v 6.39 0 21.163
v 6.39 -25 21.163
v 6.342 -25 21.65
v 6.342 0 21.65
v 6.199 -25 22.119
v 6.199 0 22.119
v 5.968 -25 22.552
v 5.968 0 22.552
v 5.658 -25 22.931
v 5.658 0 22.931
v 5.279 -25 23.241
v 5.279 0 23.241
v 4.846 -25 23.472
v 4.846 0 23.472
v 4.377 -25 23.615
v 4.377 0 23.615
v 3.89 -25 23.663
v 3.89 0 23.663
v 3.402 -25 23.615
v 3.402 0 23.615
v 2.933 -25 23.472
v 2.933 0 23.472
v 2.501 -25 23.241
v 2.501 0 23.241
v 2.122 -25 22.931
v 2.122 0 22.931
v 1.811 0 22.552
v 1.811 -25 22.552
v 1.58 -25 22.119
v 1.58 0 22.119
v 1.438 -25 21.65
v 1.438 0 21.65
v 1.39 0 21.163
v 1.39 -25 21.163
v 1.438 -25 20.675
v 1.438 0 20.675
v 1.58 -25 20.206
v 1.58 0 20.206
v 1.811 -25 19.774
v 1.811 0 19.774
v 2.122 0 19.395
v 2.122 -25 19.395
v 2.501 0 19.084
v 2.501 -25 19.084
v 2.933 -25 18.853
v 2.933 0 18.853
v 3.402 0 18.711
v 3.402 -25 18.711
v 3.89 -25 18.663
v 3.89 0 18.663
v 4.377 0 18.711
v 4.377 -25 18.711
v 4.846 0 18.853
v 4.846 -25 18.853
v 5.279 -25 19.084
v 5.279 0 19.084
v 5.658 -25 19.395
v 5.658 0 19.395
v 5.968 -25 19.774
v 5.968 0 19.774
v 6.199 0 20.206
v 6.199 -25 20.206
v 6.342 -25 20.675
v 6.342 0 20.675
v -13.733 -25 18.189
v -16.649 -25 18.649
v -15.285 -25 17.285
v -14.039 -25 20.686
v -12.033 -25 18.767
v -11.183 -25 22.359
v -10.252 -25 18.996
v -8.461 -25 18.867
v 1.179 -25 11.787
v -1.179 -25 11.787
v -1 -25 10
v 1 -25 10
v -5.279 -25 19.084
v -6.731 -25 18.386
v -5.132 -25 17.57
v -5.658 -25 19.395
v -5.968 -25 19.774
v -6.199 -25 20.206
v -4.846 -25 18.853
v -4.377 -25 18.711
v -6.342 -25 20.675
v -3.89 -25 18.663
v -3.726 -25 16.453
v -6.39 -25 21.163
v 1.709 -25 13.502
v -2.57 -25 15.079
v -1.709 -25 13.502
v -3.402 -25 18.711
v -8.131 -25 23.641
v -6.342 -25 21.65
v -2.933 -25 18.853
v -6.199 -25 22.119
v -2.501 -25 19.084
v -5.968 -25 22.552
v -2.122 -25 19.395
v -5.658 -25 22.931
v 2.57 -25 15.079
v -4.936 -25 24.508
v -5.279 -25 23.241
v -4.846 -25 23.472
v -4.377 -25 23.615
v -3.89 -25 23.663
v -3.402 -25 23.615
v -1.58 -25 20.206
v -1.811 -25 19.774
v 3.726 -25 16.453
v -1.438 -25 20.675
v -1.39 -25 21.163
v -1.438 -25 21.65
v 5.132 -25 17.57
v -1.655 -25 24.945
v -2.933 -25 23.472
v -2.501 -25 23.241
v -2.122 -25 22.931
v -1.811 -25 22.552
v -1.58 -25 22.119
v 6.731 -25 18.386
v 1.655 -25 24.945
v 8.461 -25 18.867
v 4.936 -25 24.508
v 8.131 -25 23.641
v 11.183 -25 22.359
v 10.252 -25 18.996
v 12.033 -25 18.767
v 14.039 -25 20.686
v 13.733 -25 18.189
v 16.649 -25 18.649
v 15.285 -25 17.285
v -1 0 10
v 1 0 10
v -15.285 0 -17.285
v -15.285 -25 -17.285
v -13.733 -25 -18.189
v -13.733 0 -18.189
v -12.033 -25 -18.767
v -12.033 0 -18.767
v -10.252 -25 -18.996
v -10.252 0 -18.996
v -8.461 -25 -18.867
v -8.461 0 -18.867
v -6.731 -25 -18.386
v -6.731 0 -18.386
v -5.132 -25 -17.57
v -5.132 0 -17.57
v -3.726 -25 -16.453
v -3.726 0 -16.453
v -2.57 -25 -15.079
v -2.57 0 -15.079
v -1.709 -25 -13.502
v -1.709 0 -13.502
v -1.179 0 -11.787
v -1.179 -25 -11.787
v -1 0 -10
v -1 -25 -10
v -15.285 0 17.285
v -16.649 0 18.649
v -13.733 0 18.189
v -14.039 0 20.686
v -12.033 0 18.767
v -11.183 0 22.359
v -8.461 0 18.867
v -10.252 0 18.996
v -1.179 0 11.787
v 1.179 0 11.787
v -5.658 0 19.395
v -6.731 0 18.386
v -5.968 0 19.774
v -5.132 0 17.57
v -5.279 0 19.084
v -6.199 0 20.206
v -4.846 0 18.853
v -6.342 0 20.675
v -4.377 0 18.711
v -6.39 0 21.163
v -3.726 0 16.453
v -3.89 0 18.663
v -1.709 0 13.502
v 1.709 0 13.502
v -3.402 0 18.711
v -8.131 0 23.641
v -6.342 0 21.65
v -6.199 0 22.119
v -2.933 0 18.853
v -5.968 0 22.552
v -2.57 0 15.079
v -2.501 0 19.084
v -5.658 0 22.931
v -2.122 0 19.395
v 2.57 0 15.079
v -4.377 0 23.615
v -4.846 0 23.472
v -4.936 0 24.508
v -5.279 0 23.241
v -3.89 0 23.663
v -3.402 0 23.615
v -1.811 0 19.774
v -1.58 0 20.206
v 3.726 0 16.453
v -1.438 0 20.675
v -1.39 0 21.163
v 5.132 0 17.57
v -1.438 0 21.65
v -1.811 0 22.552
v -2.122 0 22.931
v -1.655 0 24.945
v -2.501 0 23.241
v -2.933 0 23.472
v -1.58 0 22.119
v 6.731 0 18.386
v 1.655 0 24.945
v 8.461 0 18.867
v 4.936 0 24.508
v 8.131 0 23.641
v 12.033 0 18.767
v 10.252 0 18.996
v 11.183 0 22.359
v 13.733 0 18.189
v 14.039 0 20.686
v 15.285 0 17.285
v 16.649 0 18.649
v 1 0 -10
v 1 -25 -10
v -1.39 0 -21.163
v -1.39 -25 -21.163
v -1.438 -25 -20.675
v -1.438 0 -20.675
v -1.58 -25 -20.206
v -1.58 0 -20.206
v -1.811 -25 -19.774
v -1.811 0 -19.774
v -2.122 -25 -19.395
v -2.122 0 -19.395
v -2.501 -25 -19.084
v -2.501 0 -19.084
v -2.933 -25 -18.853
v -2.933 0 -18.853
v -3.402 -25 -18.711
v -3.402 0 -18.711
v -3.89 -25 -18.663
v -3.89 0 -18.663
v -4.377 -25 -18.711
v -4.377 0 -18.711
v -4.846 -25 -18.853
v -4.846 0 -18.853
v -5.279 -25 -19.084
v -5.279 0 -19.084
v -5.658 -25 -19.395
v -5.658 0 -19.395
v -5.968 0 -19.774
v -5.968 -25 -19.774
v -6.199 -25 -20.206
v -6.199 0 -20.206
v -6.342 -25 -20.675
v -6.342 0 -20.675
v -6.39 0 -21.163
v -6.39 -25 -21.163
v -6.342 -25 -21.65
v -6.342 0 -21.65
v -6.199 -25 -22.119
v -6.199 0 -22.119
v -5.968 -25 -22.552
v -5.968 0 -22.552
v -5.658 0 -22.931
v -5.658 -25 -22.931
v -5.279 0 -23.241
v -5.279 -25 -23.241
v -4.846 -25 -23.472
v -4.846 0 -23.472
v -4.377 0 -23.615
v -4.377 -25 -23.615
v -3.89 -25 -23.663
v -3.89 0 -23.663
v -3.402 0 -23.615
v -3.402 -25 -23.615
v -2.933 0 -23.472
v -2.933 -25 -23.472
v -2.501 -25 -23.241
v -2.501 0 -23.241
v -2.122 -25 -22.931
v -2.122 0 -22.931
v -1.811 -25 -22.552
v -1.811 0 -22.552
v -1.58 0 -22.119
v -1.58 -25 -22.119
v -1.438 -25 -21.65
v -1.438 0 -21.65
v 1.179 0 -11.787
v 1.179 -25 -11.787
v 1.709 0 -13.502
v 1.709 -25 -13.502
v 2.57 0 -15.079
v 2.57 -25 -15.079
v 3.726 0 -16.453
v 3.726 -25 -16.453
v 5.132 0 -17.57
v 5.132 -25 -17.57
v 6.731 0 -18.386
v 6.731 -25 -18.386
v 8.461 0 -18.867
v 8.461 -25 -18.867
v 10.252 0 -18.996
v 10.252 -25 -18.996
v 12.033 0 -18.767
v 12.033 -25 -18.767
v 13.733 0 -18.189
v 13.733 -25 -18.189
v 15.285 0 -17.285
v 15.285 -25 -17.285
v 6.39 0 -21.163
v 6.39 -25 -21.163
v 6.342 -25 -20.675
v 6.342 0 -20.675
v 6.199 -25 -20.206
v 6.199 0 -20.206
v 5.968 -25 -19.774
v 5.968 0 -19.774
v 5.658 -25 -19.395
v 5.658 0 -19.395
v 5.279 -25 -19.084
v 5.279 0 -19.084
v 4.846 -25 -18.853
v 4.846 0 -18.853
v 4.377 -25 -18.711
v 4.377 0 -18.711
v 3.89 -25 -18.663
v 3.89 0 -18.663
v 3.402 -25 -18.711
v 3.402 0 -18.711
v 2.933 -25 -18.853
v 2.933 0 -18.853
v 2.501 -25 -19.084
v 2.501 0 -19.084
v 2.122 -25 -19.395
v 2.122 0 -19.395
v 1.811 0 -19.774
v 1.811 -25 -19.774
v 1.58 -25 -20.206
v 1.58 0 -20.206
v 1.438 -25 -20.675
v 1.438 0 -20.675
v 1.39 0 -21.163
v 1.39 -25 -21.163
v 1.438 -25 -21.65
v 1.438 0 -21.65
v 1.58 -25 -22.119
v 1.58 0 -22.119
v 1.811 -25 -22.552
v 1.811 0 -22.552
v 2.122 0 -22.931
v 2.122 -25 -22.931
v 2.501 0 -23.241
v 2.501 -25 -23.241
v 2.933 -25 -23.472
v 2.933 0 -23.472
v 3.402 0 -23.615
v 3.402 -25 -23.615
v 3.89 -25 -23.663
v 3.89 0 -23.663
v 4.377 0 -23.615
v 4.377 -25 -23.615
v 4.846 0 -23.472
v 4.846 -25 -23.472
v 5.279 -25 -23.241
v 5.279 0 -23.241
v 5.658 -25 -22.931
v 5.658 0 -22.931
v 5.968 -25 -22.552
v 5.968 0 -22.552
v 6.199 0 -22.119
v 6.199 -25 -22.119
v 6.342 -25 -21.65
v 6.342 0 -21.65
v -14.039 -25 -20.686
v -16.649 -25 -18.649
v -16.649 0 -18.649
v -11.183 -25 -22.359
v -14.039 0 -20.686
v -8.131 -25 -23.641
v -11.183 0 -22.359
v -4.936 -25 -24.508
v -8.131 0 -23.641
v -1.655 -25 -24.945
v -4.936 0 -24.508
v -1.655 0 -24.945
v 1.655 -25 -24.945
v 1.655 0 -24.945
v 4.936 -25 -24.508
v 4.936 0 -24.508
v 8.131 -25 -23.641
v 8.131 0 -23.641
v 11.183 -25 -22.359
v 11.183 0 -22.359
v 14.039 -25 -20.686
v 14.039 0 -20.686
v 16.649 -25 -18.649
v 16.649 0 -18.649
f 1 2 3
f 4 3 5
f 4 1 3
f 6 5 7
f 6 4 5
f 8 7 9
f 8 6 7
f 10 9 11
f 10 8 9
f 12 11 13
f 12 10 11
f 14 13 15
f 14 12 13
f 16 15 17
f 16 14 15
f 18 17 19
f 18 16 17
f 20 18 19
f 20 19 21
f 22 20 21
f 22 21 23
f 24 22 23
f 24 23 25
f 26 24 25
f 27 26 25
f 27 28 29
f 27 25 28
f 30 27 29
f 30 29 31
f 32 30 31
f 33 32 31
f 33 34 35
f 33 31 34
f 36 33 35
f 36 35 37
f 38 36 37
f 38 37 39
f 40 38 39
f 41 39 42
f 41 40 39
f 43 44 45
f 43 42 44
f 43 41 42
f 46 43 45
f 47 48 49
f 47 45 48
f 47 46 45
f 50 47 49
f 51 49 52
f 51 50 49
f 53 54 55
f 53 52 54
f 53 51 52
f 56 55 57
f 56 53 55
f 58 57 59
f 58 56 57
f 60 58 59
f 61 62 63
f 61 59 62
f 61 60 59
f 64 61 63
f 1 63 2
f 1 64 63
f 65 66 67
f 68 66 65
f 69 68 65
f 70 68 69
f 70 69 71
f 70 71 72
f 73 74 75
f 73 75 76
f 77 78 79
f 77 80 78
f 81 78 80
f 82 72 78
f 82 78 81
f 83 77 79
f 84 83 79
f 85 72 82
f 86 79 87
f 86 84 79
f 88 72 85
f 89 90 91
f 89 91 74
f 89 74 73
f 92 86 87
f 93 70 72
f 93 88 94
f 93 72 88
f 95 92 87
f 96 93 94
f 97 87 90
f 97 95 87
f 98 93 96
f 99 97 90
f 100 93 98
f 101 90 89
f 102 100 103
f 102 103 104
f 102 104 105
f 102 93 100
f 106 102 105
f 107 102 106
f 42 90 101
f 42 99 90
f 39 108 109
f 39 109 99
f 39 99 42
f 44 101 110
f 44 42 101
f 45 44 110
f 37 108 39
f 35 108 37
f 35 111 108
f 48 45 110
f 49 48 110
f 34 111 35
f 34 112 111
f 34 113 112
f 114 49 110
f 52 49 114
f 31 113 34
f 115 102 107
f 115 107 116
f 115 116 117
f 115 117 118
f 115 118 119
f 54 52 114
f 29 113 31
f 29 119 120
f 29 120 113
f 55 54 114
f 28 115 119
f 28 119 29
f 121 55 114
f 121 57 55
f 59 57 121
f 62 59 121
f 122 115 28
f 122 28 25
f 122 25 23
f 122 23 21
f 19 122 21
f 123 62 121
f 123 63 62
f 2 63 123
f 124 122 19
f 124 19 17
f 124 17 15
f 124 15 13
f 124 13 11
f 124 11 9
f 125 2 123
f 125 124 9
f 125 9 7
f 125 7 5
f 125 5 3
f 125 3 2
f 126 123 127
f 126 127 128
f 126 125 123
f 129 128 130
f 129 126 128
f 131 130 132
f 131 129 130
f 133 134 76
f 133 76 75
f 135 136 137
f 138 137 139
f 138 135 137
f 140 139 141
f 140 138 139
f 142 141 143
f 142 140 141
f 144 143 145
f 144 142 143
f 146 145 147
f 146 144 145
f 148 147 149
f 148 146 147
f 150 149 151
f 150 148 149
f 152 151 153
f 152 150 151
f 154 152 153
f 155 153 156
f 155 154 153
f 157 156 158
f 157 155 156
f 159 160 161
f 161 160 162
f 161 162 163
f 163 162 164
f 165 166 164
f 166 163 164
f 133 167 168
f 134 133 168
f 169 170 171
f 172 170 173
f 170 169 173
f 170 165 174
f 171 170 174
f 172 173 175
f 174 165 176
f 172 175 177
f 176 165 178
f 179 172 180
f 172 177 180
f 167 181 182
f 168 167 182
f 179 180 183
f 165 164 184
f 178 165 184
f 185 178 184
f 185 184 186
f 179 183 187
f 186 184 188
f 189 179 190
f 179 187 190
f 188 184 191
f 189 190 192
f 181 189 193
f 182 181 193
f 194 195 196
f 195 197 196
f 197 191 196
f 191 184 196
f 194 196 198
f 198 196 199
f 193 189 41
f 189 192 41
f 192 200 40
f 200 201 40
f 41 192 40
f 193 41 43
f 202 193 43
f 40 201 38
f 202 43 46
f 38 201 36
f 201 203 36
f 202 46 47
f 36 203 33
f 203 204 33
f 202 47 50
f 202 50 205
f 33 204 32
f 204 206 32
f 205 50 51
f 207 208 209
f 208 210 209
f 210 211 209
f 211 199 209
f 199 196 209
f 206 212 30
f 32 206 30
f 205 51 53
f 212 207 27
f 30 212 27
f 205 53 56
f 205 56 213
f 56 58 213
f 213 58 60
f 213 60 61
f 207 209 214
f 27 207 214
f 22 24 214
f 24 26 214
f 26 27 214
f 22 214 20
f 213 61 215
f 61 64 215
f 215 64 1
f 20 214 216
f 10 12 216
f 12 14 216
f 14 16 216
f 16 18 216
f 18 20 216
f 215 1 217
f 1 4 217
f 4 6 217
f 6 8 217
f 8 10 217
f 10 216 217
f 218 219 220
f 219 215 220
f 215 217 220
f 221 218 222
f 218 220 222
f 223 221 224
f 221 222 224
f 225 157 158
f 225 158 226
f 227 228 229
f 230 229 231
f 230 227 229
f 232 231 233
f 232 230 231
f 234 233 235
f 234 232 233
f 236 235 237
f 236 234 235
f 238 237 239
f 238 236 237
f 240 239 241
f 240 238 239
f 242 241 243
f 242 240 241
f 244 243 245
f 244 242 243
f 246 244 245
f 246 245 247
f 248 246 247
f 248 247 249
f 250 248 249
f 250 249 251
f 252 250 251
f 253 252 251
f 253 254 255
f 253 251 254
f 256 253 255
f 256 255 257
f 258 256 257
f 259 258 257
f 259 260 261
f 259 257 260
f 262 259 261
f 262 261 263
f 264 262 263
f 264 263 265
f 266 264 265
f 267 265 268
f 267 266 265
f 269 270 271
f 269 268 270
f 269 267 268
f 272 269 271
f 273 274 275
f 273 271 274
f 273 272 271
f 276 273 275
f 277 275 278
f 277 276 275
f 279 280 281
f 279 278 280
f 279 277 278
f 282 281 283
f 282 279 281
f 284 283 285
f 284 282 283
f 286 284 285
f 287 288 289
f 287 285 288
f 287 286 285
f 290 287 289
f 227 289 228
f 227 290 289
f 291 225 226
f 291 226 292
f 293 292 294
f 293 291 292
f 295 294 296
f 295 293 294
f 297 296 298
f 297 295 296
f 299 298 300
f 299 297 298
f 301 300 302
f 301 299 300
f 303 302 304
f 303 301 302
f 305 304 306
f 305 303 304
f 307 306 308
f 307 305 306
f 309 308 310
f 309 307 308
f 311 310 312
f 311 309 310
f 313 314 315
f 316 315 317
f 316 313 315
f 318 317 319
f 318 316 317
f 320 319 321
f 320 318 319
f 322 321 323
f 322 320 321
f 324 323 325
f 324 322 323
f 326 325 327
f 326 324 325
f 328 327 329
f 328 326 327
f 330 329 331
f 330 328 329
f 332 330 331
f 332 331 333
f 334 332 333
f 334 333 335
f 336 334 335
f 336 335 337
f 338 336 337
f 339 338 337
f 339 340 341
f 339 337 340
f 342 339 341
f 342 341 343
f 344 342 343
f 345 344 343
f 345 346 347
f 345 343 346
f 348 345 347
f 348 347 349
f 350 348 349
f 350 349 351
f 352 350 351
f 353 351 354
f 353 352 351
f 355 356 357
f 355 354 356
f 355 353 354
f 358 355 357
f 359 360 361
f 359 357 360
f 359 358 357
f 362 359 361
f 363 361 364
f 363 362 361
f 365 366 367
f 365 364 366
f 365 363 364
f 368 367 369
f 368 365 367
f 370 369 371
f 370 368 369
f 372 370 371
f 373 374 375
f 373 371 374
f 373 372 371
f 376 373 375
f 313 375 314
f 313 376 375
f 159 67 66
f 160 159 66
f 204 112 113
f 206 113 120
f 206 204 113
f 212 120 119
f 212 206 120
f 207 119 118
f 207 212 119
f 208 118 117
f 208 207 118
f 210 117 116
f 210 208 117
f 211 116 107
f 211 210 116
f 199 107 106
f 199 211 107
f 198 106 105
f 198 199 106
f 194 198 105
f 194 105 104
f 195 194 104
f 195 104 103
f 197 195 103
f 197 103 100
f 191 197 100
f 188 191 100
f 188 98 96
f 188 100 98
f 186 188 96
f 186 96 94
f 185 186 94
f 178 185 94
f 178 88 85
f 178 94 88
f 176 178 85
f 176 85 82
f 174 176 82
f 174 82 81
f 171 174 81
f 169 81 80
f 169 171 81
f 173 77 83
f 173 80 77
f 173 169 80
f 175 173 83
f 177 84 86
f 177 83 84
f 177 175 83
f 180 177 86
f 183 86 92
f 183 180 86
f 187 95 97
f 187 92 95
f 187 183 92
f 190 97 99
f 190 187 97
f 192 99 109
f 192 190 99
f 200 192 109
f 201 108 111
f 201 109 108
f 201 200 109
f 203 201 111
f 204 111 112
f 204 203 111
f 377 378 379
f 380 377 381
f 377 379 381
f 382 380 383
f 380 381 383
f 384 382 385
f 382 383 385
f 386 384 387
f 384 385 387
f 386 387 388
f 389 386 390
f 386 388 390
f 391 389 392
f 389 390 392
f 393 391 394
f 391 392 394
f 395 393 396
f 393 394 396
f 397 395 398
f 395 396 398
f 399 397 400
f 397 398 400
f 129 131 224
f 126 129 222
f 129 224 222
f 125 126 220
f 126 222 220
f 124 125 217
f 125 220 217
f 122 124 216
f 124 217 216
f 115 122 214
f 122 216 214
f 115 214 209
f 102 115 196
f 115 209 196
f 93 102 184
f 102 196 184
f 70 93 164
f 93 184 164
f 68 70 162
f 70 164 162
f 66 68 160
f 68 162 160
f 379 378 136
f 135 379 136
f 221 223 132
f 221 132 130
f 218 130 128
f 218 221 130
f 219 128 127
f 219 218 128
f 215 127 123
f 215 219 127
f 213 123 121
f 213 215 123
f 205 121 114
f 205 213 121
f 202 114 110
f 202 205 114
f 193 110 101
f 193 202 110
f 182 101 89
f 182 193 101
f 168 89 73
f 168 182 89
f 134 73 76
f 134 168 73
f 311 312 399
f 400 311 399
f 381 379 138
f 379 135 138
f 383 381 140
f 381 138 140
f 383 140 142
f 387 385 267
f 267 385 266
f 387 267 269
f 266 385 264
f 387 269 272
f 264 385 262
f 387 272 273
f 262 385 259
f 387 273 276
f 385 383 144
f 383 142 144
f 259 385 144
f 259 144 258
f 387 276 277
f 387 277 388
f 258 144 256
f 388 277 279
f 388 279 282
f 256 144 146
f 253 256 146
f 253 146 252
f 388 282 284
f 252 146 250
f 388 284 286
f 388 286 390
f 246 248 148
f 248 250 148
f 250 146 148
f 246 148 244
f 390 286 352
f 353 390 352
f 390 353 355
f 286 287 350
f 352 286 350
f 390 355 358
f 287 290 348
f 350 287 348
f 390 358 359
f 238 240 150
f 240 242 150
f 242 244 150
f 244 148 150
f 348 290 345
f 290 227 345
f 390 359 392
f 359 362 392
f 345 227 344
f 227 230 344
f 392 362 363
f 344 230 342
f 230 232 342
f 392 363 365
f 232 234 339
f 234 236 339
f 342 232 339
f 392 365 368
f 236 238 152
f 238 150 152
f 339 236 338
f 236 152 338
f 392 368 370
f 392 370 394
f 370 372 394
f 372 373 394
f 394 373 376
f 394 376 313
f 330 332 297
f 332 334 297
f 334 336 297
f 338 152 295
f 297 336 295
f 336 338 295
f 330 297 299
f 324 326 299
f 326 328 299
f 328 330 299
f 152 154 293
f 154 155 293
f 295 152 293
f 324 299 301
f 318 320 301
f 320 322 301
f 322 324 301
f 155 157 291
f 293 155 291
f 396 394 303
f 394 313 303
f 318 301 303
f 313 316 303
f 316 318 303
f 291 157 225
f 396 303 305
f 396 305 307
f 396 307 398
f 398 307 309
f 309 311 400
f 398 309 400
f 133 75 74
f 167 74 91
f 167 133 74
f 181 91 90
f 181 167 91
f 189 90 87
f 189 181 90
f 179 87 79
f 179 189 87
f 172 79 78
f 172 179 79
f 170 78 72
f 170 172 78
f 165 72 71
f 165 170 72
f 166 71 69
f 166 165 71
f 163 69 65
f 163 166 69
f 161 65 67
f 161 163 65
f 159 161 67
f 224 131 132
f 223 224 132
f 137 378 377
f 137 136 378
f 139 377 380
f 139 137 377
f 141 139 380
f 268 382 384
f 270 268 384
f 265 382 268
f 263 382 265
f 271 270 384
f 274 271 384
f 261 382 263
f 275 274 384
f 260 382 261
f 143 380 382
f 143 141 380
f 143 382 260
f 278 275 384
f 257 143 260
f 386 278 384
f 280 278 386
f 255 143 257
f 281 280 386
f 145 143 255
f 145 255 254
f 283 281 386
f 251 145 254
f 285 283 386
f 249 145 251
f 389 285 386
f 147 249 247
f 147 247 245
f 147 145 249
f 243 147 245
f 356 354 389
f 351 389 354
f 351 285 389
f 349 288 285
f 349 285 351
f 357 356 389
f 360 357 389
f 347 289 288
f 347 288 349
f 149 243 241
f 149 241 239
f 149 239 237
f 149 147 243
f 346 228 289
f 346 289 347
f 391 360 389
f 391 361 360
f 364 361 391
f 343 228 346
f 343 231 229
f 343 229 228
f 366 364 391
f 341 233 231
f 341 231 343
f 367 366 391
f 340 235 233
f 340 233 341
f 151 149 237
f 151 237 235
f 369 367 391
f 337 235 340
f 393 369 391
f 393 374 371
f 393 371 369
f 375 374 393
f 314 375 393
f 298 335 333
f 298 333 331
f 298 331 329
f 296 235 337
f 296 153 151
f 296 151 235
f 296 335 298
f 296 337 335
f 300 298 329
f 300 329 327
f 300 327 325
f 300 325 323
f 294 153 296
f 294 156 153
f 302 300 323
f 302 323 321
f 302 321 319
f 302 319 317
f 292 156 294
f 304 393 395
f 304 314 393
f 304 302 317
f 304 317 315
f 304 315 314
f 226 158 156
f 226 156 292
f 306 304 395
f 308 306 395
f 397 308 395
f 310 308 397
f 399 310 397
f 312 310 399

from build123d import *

# Parameters (mm, degrees)
F0_R     = 25
F1_DEPTH = 25
F2_R     = 9
F3_DEPTH = 27.8
F5_DEPTH = 27.8
F6_R     = 2.5
F7_DEPTH = 45.7


with BuildPart() as f1:
    # F0 (on Front) → F1 (new body)
    with BuildSketch(Plane.XZ):
        Circle(F0_R)
    extrude(amount=F1_DEPTH)

    # F2 (on Front) → F3 (cut)
    with BuildSketch(Plane.XZ):
        with Locations((10, 10)):
            Circle(F2_R)
        with Locations((10, -10)):
            Circle(F2_R)
        with Locations((-10, 10)):
            Circle(F2_R)
        with Locations((-10, -10)):
            Circle(F2_R)
    extrude(amount=F3_DEPTH, mode=Mode.SUBTRACT)

    # F4 (on Front) → F5 (cut)
    with BuildSketch(Plane.XZ):
        Polygon((29.275397, 31.275397), (8, 10), (-8, 10), (-29.194527, 31.194527), (-29.194527, -31.194527), (-8, -10), (8, -10), (28.106605, -30.106605), align=None)
    extrude(amount=F5_DEPTH, mode=Mode.SUBTRACT)

    # F6 (on Front) → F7 (cut)
    with BuildSketch(Plane.XZ):
        with Locations((-3.889734, 21.162739)):
            Circle(F6_R)
        with Locations((3.889734, 21.162739)):
            Circle(F6_R)
        with Locations((3.889734, -21.162739)):
            Circle(F6_R)
        with Locations((-3.889734, -21.162739)):
            Circle(F6_R)
    extrude(amount=F7_DEPTH, mode=Mode.SUBTRACT)


solid = f1.part
